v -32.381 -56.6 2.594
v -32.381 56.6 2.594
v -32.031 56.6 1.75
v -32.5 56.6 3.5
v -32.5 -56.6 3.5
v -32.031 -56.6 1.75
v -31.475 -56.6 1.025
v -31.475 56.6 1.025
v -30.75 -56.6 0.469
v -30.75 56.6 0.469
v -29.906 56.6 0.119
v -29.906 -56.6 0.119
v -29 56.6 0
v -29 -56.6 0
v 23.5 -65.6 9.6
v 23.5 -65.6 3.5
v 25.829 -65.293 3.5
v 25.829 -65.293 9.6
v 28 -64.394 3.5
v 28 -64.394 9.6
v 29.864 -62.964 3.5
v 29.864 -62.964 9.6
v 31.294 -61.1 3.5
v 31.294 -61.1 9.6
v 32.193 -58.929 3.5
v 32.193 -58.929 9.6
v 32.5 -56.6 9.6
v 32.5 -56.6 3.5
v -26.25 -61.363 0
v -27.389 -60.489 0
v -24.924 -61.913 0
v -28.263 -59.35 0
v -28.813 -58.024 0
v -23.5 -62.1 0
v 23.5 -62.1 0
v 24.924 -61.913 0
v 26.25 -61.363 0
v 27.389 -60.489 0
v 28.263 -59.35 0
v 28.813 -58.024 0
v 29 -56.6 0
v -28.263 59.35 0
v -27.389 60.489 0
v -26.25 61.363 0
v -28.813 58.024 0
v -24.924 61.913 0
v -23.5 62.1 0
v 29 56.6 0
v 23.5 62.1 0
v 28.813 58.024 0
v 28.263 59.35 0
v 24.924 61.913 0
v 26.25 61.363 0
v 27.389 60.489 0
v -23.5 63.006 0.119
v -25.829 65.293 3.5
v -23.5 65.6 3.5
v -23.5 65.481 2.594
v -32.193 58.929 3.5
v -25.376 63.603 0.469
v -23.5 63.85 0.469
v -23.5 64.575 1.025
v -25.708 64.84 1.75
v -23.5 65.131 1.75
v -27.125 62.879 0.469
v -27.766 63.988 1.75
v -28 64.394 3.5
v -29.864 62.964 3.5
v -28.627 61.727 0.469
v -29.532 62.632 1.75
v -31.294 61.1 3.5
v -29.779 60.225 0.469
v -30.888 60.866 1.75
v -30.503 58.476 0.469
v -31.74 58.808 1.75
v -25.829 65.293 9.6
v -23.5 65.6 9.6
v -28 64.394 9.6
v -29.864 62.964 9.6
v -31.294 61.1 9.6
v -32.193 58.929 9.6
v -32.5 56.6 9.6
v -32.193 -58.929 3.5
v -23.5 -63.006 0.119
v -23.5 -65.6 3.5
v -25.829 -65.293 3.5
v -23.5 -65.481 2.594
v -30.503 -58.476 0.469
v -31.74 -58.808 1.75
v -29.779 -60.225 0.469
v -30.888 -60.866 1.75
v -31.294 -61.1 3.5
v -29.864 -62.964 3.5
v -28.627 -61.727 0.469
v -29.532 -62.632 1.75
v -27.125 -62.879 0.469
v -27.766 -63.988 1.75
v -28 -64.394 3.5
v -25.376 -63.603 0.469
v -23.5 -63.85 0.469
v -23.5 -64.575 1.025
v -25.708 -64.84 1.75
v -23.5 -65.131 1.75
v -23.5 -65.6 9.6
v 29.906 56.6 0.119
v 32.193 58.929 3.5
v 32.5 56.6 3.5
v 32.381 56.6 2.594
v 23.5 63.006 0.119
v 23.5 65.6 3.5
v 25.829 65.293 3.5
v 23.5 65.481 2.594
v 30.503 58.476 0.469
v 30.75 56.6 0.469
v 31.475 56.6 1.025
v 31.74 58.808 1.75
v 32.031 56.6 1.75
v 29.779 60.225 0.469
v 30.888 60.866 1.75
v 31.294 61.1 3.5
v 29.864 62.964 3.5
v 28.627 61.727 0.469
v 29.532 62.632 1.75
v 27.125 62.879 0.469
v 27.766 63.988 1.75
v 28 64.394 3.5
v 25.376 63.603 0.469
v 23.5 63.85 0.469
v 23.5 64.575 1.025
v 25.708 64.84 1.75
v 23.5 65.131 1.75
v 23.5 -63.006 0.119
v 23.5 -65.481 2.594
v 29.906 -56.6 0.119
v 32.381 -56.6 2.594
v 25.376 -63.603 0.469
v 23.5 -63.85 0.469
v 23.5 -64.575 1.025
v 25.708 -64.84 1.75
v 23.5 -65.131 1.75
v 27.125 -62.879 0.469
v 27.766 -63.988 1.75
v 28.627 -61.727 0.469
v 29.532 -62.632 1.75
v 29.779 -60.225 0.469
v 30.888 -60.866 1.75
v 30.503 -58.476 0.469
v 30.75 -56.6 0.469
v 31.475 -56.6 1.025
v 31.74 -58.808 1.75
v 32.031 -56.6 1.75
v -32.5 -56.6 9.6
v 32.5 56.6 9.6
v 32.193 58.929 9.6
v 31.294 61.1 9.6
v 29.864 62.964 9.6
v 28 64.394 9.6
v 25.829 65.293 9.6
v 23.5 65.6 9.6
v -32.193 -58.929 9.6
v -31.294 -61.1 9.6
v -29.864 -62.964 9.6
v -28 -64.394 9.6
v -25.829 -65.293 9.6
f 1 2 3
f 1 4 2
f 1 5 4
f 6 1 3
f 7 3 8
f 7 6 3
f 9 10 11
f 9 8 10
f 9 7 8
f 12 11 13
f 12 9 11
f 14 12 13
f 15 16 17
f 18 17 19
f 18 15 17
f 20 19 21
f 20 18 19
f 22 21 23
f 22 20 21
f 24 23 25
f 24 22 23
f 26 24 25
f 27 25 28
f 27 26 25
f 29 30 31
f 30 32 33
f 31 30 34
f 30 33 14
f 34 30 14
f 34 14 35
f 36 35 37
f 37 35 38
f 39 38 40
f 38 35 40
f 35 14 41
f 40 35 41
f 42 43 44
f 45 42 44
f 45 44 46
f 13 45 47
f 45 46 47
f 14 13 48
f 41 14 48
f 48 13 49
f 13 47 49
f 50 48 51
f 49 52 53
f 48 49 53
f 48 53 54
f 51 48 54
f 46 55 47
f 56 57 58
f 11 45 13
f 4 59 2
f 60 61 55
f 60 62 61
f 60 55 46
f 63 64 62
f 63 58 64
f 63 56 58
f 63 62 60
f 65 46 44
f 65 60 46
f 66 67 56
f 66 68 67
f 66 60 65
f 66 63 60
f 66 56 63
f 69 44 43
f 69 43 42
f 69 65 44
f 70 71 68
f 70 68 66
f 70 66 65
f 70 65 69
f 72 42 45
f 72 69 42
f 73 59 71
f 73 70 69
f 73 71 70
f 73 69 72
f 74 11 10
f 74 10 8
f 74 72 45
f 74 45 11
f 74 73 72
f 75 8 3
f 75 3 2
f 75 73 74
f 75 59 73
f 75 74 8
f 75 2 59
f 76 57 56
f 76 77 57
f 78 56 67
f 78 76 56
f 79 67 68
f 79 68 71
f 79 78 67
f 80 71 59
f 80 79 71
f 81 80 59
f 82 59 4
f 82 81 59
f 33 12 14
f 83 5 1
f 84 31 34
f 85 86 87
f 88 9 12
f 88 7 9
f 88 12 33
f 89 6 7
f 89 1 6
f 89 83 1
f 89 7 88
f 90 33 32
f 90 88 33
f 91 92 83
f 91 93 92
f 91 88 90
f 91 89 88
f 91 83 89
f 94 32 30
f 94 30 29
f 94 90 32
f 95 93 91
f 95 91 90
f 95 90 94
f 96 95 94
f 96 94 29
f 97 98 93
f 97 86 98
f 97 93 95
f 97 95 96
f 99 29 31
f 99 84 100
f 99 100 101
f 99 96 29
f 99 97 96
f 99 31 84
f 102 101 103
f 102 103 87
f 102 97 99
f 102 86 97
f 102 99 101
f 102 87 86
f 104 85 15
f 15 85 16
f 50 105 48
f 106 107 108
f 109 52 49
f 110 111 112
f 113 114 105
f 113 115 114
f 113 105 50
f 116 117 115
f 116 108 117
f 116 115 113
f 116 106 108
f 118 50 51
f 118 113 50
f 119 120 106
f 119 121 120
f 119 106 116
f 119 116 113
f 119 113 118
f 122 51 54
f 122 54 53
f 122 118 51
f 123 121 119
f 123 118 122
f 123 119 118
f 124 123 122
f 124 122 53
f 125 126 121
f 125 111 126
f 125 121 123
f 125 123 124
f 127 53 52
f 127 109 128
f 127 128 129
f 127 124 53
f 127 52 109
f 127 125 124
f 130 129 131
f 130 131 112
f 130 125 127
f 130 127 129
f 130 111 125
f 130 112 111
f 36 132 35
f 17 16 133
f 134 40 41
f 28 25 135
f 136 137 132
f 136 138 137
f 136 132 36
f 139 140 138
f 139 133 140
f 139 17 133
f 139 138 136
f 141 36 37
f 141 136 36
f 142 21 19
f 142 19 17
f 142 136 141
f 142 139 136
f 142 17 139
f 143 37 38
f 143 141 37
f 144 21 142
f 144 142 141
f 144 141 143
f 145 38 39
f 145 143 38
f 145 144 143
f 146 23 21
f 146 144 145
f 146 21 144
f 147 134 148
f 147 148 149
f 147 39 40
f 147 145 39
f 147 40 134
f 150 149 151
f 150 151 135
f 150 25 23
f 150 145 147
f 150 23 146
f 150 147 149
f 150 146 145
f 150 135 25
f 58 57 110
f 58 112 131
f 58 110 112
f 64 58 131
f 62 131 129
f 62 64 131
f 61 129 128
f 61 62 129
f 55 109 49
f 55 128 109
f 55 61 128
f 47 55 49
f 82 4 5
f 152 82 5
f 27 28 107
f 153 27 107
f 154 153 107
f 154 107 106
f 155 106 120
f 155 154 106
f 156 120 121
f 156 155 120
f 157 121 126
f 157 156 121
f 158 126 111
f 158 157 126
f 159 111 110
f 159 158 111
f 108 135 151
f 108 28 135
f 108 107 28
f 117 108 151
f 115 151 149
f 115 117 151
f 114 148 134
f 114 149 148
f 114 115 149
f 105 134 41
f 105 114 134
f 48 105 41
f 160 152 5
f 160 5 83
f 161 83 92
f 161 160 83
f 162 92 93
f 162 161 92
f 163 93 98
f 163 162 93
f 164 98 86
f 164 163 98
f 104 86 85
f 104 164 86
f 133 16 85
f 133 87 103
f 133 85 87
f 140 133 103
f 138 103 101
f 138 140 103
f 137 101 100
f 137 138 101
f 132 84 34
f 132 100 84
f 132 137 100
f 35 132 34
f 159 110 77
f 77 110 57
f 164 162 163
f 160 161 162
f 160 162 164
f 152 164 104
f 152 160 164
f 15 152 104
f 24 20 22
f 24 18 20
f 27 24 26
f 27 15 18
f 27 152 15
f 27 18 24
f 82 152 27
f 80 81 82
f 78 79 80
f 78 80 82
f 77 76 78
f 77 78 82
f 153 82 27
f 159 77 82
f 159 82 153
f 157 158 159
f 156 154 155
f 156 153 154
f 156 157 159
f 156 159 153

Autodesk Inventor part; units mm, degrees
ref_plane "YZ Plane" through (0, 0, 0) normal (1, 0, 0) x (0, 1, 0)
ref_plane "XZ Plane" through (0, 0, 0) normal (0, 1, 0) x (-1, 0, 0)
ref_plane "XY Plane" through (0, 0, 0) normal (0, 0, 1) x (1, 0, 0)
sketch "Sketch1" plane through (0, 0, 0) normal (0, 0, 1) x (1, 0, 0)
  line L0 (-32.5, -65.6) -> (32.5, -65.6)
  line L1 (32.5, -65.6) -> (32.5, 65.6)
  line L2 (32.5, 65.6) -> (-32.5, 65.6)
  line L3 (-32.5, 65.6) -> (-32.5, -65.6)
  line L4 (-32.5, -65.6) -> (32.5, 65.6) construction
  line L5 (32.5, -65.6) -> (-32.5, 65.6) construction
  point P0 (0, 0)
  dimension "d0" = 65
  dimension "d1" = 131.2
extrude "Extrusion1" add sketch "Sketch1" along normal blind 9.6
fillet "Fillet1" radius 3.5 4 edges at (32.5, 0, 0) (0, 65.6, 0) (-32.5, 0, 0) (0, -65.6, 0)
fillet "Fillet1" radius 9 4 edges at (32.5, 65.6, 4.8) (-32.5, 65.6, 4.8) (-32.5, -65.6, 4.8) (32.5, -65.6, 4.8)
properties part number "basic shape"
